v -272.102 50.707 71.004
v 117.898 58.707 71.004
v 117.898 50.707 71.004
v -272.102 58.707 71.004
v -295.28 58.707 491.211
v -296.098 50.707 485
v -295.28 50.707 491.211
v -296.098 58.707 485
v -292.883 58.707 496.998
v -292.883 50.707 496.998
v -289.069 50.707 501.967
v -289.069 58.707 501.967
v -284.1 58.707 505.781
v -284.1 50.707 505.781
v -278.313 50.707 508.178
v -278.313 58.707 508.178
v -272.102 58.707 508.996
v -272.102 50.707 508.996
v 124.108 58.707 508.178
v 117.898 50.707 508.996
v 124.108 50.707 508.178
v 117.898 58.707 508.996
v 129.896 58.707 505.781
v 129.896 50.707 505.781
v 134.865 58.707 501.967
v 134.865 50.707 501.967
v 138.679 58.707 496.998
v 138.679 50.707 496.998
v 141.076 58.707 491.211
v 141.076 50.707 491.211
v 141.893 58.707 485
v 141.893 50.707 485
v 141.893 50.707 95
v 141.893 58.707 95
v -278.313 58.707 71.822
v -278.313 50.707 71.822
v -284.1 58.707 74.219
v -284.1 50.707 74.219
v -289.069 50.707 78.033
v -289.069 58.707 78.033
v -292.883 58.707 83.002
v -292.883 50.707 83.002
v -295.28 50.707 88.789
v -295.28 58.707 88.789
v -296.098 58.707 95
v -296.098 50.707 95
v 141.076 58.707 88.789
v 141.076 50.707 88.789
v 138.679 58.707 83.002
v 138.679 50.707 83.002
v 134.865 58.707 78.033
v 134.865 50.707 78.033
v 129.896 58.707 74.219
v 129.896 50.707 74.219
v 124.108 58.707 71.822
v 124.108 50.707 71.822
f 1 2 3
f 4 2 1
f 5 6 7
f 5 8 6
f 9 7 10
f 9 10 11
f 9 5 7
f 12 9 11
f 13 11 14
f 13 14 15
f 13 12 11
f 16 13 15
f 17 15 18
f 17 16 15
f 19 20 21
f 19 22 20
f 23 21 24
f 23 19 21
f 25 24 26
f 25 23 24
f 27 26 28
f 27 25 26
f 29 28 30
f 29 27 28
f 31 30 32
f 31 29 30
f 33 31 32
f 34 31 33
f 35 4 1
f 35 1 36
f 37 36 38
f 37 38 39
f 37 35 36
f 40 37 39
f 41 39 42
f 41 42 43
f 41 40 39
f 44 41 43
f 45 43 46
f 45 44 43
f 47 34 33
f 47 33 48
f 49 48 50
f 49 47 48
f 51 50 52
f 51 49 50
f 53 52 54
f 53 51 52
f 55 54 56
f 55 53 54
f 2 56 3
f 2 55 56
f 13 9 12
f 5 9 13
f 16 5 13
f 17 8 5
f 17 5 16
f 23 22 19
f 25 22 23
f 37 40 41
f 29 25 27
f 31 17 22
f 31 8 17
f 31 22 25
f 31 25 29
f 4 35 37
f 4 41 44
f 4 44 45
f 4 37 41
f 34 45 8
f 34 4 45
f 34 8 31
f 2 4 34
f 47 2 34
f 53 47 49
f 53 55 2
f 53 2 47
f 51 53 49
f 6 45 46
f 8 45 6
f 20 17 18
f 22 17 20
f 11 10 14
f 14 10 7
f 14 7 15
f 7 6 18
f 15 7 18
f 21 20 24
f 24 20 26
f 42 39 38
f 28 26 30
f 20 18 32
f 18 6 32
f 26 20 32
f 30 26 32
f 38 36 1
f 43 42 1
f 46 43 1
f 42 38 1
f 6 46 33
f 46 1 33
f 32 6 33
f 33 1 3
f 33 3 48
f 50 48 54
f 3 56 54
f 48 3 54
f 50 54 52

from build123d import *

# Parameters (mm, degrees)
SALIENTE_EXTRUIR1_DEPTH = 4


with BuildPart() as part:
    # Croquis1 → Saliente-Extruir1 (new, symmetric)
    with BuildSketch(Plane(origin=(0, 54.707138557, 0), x_dir=(1, 0, 0), z_dir=(0, 1, 0))):
        with BuildLine():
            Line((-178.357036721, -508.99553457), (117.897963279, -508.99553457))
            ThreePointArc((117.897963279, -508.99553457), (134.865368491, -501.967405212), (141.893497848, -485))
            Line((141.893497848, -485), (141.893497848, -95))
            ThreePointArc((141.893497848, -95), (134.865368491, -78.032594788), (117.897963279, -71.00446543))
            Line((117.897963279, -71.00446543), (24.152963279, -71.00446543))
            Line((24.152963279, -71.00446543), (-272.102036721, -71.00446543))
            ThreePointArc((-272.102036721, -71.00446543), (-289.069441934, -78.032594788), (-296.097571291, -95))
            Line((-296.097571291, -95), (-296.097571291, -485))
            ThreePointArc((-296.097571291, -485), (-289.069441934, -501.967405212), (-272.102036721, -508.99553457))
            Line((-272.102036721, -508.99553457), (-178.357036721, -508.99553457))
        make_face()
    extrude(amount=SALIENTE_EXTRUIR1_DEPTH, both=True)


solid = part.part
